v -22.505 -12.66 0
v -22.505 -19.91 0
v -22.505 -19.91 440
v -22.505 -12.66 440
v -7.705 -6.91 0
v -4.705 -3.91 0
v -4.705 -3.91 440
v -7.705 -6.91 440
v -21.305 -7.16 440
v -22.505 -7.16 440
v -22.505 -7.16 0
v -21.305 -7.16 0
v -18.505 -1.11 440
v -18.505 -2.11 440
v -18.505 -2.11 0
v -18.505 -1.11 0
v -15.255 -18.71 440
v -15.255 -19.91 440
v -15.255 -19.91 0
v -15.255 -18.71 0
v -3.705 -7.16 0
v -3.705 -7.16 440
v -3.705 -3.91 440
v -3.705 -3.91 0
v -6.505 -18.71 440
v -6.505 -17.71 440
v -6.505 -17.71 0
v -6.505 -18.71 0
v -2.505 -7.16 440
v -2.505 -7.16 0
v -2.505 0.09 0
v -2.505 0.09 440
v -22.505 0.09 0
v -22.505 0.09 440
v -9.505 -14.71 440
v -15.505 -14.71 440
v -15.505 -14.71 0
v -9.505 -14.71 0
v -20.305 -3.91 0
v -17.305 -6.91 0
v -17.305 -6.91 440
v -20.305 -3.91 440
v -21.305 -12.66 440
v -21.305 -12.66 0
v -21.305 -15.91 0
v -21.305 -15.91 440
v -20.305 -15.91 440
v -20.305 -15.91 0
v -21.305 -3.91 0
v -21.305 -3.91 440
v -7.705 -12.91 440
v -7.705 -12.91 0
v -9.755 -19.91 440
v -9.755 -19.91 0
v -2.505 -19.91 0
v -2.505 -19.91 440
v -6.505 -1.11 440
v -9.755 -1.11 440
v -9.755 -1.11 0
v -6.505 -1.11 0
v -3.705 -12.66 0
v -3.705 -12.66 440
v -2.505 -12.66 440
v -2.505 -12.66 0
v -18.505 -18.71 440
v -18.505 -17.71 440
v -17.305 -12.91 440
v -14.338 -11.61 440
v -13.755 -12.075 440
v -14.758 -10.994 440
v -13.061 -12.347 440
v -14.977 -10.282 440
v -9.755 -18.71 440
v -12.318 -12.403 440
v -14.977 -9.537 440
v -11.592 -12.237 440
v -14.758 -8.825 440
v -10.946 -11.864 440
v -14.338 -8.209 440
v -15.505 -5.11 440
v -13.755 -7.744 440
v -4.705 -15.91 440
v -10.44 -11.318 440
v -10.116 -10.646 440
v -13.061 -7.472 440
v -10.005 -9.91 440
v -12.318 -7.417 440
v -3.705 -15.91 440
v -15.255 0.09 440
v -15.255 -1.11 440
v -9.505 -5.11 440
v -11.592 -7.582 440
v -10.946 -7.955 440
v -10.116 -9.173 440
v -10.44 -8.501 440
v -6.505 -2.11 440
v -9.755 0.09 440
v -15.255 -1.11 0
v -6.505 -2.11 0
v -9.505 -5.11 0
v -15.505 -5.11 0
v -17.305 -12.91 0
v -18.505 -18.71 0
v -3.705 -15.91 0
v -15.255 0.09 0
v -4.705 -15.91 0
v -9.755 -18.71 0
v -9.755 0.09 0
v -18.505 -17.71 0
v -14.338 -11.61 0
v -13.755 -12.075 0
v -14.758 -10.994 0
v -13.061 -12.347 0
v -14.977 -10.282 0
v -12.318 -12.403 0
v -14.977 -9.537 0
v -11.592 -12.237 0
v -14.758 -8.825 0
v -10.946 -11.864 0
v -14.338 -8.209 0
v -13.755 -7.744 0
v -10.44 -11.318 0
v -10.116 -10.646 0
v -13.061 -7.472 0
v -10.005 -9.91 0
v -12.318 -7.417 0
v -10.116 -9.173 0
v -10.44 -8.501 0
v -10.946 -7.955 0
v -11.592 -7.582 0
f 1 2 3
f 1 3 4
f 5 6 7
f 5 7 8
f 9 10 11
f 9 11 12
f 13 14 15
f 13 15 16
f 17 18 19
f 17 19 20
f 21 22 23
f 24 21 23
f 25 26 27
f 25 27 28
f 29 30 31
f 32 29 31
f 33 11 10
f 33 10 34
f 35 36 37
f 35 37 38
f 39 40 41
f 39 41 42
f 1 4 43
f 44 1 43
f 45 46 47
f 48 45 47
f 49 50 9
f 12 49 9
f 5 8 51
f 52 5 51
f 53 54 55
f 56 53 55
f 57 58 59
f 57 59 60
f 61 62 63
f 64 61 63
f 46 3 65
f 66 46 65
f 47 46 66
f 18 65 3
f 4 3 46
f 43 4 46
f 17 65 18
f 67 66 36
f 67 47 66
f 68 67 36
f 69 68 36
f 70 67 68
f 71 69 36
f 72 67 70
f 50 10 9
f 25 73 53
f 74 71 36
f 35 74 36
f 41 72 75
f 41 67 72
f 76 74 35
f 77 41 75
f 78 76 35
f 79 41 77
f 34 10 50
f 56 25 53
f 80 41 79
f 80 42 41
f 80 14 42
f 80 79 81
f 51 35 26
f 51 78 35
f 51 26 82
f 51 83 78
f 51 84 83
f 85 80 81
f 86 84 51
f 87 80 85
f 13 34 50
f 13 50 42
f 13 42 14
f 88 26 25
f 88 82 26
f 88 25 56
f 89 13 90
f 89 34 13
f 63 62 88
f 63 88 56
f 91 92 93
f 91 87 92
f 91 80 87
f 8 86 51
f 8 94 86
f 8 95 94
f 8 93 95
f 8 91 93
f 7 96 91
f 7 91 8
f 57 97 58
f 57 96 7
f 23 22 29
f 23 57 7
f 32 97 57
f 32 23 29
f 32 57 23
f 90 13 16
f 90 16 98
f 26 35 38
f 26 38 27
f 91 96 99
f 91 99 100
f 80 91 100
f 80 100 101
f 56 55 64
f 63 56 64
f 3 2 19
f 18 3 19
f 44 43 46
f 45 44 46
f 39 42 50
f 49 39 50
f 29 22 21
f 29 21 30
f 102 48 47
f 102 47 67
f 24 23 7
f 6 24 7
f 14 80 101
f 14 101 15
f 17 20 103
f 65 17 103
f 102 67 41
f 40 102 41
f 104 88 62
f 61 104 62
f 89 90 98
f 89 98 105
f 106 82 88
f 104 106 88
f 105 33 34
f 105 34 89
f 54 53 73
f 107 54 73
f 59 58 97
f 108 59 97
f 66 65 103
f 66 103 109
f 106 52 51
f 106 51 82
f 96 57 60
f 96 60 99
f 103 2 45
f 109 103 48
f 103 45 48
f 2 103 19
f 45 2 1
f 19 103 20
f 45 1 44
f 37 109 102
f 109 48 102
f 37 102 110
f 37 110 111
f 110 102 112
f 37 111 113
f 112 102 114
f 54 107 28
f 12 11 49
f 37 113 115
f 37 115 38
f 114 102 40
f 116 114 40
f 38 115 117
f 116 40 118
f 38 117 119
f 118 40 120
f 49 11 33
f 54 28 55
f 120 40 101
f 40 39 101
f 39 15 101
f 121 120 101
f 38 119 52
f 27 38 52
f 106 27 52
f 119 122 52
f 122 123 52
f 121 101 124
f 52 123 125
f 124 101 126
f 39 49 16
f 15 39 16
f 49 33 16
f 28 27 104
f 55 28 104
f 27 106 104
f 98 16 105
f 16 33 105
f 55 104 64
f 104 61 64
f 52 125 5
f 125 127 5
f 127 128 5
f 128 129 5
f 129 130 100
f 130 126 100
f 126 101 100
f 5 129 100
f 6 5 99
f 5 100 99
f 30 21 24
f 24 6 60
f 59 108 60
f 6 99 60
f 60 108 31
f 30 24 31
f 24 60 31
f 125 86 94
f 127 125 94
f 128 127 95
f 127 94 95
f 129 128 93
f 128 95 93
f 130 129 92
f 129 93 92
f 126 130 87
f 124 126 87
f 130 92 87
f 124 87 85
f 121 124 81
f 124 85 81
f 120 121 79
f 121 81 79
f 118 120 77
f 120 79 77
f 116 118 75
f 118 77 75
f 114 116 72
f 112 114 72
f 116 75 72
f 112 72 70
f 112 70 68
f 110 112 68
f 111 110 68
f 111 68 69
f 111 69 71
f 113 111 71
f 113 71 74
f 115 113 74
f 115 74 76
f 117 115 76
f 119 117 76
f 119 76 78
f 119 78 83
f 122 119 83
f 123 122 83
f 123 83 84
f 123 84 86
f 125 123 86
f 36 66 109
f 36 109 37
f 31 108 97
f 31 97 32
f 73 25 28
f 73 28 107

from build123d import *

# Parameters (mm, degrees)
ESQUISSE1_W             = 20
ESQUISSE1_H             = 20
BOSS_EXTRU_1_DEPTH      = 440
ESQUISSE2_W             = 1.2
ESQUISSE2_H             = 5.5
ESQUISSE2_W_2           = 5.5
ESQUISSE2_H_2           = 1.2
ENL_V_MAT_EXTRU_1_DEPTH = 441
ENL_V_MAT_EXTRU_2_DEPTH = 441
ESQUISSE4_R             = 2.5
ENL_V_MAT_EXTRU_3_DEPTH = 441


with BuildPart() as part:
    # Esquisse1 → Boss.-Extru.1 (new body)
    with BuildSketch(Plane.XY):
        with Locations((-12.505109137, -9.909560068)):
            Rectangle(ESQUISSE1_W, ESQUISSE1_H)
    extrude(amount=BOSS_EXTRU_1_DEPTH)

    # Esquisse2 → Enlèv. mat.-Extru.1 (cut, through all)
    with BuildSketch(Plane.XY.offset(440)):
        with Locations((-21.905109137, -9.909560068)):
            Rectangle(ESQUISSE2_W, ESQUISSE2_H)
        with Locations((-12.505109137, -0.509560068)):
            Rectangle(ESQUISSE2_W_2, ESQUISSE2_H_2)
        with Locations((-3.105109137, -9.909560068)):
            Rectangle(ESQUISSE2_W, ESQUISSE2_H)
        with Locations((-12.505109137, -19.309560068)):
            Rectangle(ESQUISSE2_W_2, ESQUISSE2_H_2)
    extrude(amount=-ENL_V_MAT_EXTRU_1_DEPTH, mode=Mode.SUBTRACT)

    # Esquisse3 → Enlèv. mat.-Extru.2 (cut, through all)
    with BuildSketch(Plane.XY.offset(440)):
        Polygon((-21.305109137, -15.909560068), (-20.305109137, -15.909560068), (-17.305109137, -12.909560068), (-17.305109137, -6.909560068), (-20.305109137, -3.909560068), (-21.305109137, -3.909560068), align=None)
        Polygon((-18.505109137, -1.109560068), (-6.505109137, -1.109560068), (-6.505109137, -2.109560068), (-9.505109137, -5.109560068), (-15.505109137, -5.109560068), (-18.505109137, -2.109560068), align=None)
        Polygon((-3.705109137, -3.909560068), (-4.705109137, -3.909560068), (-7.705109137, -6.909560068), (-7.705109137, -12.909560068), (-4.705109137, -15.909560068), (-3.705109137, -15.909560068), align=None)
        Polygon((-6.505109137, -18.709560068), (-18.505109137, -18.709560068), (-18.505109137, -17.709560068), (-15.505109137, -14.709560068), (-9.505109137, -14.709560068), (-6.505109137, -17.709560068), align=None)
    extrude(amount=-ENL_V_MAT_EXTRU_2_DEPTH, mode=Mode.SUBTRACT)

    # Esquisse4 → Enlèv. mat.-Extru.3 (cut, through all)
    with BuildSketch(Plane.XY.offset(440)):
        with Locations((-12.505109137, -9.909560068)):
            Circle(ESQUISSE4_R)
    extrude(amount=-ENL_V_MAT_EXTRU_3_DEPTH, mode=Mode.SUBTRACT)


solid = part.part
